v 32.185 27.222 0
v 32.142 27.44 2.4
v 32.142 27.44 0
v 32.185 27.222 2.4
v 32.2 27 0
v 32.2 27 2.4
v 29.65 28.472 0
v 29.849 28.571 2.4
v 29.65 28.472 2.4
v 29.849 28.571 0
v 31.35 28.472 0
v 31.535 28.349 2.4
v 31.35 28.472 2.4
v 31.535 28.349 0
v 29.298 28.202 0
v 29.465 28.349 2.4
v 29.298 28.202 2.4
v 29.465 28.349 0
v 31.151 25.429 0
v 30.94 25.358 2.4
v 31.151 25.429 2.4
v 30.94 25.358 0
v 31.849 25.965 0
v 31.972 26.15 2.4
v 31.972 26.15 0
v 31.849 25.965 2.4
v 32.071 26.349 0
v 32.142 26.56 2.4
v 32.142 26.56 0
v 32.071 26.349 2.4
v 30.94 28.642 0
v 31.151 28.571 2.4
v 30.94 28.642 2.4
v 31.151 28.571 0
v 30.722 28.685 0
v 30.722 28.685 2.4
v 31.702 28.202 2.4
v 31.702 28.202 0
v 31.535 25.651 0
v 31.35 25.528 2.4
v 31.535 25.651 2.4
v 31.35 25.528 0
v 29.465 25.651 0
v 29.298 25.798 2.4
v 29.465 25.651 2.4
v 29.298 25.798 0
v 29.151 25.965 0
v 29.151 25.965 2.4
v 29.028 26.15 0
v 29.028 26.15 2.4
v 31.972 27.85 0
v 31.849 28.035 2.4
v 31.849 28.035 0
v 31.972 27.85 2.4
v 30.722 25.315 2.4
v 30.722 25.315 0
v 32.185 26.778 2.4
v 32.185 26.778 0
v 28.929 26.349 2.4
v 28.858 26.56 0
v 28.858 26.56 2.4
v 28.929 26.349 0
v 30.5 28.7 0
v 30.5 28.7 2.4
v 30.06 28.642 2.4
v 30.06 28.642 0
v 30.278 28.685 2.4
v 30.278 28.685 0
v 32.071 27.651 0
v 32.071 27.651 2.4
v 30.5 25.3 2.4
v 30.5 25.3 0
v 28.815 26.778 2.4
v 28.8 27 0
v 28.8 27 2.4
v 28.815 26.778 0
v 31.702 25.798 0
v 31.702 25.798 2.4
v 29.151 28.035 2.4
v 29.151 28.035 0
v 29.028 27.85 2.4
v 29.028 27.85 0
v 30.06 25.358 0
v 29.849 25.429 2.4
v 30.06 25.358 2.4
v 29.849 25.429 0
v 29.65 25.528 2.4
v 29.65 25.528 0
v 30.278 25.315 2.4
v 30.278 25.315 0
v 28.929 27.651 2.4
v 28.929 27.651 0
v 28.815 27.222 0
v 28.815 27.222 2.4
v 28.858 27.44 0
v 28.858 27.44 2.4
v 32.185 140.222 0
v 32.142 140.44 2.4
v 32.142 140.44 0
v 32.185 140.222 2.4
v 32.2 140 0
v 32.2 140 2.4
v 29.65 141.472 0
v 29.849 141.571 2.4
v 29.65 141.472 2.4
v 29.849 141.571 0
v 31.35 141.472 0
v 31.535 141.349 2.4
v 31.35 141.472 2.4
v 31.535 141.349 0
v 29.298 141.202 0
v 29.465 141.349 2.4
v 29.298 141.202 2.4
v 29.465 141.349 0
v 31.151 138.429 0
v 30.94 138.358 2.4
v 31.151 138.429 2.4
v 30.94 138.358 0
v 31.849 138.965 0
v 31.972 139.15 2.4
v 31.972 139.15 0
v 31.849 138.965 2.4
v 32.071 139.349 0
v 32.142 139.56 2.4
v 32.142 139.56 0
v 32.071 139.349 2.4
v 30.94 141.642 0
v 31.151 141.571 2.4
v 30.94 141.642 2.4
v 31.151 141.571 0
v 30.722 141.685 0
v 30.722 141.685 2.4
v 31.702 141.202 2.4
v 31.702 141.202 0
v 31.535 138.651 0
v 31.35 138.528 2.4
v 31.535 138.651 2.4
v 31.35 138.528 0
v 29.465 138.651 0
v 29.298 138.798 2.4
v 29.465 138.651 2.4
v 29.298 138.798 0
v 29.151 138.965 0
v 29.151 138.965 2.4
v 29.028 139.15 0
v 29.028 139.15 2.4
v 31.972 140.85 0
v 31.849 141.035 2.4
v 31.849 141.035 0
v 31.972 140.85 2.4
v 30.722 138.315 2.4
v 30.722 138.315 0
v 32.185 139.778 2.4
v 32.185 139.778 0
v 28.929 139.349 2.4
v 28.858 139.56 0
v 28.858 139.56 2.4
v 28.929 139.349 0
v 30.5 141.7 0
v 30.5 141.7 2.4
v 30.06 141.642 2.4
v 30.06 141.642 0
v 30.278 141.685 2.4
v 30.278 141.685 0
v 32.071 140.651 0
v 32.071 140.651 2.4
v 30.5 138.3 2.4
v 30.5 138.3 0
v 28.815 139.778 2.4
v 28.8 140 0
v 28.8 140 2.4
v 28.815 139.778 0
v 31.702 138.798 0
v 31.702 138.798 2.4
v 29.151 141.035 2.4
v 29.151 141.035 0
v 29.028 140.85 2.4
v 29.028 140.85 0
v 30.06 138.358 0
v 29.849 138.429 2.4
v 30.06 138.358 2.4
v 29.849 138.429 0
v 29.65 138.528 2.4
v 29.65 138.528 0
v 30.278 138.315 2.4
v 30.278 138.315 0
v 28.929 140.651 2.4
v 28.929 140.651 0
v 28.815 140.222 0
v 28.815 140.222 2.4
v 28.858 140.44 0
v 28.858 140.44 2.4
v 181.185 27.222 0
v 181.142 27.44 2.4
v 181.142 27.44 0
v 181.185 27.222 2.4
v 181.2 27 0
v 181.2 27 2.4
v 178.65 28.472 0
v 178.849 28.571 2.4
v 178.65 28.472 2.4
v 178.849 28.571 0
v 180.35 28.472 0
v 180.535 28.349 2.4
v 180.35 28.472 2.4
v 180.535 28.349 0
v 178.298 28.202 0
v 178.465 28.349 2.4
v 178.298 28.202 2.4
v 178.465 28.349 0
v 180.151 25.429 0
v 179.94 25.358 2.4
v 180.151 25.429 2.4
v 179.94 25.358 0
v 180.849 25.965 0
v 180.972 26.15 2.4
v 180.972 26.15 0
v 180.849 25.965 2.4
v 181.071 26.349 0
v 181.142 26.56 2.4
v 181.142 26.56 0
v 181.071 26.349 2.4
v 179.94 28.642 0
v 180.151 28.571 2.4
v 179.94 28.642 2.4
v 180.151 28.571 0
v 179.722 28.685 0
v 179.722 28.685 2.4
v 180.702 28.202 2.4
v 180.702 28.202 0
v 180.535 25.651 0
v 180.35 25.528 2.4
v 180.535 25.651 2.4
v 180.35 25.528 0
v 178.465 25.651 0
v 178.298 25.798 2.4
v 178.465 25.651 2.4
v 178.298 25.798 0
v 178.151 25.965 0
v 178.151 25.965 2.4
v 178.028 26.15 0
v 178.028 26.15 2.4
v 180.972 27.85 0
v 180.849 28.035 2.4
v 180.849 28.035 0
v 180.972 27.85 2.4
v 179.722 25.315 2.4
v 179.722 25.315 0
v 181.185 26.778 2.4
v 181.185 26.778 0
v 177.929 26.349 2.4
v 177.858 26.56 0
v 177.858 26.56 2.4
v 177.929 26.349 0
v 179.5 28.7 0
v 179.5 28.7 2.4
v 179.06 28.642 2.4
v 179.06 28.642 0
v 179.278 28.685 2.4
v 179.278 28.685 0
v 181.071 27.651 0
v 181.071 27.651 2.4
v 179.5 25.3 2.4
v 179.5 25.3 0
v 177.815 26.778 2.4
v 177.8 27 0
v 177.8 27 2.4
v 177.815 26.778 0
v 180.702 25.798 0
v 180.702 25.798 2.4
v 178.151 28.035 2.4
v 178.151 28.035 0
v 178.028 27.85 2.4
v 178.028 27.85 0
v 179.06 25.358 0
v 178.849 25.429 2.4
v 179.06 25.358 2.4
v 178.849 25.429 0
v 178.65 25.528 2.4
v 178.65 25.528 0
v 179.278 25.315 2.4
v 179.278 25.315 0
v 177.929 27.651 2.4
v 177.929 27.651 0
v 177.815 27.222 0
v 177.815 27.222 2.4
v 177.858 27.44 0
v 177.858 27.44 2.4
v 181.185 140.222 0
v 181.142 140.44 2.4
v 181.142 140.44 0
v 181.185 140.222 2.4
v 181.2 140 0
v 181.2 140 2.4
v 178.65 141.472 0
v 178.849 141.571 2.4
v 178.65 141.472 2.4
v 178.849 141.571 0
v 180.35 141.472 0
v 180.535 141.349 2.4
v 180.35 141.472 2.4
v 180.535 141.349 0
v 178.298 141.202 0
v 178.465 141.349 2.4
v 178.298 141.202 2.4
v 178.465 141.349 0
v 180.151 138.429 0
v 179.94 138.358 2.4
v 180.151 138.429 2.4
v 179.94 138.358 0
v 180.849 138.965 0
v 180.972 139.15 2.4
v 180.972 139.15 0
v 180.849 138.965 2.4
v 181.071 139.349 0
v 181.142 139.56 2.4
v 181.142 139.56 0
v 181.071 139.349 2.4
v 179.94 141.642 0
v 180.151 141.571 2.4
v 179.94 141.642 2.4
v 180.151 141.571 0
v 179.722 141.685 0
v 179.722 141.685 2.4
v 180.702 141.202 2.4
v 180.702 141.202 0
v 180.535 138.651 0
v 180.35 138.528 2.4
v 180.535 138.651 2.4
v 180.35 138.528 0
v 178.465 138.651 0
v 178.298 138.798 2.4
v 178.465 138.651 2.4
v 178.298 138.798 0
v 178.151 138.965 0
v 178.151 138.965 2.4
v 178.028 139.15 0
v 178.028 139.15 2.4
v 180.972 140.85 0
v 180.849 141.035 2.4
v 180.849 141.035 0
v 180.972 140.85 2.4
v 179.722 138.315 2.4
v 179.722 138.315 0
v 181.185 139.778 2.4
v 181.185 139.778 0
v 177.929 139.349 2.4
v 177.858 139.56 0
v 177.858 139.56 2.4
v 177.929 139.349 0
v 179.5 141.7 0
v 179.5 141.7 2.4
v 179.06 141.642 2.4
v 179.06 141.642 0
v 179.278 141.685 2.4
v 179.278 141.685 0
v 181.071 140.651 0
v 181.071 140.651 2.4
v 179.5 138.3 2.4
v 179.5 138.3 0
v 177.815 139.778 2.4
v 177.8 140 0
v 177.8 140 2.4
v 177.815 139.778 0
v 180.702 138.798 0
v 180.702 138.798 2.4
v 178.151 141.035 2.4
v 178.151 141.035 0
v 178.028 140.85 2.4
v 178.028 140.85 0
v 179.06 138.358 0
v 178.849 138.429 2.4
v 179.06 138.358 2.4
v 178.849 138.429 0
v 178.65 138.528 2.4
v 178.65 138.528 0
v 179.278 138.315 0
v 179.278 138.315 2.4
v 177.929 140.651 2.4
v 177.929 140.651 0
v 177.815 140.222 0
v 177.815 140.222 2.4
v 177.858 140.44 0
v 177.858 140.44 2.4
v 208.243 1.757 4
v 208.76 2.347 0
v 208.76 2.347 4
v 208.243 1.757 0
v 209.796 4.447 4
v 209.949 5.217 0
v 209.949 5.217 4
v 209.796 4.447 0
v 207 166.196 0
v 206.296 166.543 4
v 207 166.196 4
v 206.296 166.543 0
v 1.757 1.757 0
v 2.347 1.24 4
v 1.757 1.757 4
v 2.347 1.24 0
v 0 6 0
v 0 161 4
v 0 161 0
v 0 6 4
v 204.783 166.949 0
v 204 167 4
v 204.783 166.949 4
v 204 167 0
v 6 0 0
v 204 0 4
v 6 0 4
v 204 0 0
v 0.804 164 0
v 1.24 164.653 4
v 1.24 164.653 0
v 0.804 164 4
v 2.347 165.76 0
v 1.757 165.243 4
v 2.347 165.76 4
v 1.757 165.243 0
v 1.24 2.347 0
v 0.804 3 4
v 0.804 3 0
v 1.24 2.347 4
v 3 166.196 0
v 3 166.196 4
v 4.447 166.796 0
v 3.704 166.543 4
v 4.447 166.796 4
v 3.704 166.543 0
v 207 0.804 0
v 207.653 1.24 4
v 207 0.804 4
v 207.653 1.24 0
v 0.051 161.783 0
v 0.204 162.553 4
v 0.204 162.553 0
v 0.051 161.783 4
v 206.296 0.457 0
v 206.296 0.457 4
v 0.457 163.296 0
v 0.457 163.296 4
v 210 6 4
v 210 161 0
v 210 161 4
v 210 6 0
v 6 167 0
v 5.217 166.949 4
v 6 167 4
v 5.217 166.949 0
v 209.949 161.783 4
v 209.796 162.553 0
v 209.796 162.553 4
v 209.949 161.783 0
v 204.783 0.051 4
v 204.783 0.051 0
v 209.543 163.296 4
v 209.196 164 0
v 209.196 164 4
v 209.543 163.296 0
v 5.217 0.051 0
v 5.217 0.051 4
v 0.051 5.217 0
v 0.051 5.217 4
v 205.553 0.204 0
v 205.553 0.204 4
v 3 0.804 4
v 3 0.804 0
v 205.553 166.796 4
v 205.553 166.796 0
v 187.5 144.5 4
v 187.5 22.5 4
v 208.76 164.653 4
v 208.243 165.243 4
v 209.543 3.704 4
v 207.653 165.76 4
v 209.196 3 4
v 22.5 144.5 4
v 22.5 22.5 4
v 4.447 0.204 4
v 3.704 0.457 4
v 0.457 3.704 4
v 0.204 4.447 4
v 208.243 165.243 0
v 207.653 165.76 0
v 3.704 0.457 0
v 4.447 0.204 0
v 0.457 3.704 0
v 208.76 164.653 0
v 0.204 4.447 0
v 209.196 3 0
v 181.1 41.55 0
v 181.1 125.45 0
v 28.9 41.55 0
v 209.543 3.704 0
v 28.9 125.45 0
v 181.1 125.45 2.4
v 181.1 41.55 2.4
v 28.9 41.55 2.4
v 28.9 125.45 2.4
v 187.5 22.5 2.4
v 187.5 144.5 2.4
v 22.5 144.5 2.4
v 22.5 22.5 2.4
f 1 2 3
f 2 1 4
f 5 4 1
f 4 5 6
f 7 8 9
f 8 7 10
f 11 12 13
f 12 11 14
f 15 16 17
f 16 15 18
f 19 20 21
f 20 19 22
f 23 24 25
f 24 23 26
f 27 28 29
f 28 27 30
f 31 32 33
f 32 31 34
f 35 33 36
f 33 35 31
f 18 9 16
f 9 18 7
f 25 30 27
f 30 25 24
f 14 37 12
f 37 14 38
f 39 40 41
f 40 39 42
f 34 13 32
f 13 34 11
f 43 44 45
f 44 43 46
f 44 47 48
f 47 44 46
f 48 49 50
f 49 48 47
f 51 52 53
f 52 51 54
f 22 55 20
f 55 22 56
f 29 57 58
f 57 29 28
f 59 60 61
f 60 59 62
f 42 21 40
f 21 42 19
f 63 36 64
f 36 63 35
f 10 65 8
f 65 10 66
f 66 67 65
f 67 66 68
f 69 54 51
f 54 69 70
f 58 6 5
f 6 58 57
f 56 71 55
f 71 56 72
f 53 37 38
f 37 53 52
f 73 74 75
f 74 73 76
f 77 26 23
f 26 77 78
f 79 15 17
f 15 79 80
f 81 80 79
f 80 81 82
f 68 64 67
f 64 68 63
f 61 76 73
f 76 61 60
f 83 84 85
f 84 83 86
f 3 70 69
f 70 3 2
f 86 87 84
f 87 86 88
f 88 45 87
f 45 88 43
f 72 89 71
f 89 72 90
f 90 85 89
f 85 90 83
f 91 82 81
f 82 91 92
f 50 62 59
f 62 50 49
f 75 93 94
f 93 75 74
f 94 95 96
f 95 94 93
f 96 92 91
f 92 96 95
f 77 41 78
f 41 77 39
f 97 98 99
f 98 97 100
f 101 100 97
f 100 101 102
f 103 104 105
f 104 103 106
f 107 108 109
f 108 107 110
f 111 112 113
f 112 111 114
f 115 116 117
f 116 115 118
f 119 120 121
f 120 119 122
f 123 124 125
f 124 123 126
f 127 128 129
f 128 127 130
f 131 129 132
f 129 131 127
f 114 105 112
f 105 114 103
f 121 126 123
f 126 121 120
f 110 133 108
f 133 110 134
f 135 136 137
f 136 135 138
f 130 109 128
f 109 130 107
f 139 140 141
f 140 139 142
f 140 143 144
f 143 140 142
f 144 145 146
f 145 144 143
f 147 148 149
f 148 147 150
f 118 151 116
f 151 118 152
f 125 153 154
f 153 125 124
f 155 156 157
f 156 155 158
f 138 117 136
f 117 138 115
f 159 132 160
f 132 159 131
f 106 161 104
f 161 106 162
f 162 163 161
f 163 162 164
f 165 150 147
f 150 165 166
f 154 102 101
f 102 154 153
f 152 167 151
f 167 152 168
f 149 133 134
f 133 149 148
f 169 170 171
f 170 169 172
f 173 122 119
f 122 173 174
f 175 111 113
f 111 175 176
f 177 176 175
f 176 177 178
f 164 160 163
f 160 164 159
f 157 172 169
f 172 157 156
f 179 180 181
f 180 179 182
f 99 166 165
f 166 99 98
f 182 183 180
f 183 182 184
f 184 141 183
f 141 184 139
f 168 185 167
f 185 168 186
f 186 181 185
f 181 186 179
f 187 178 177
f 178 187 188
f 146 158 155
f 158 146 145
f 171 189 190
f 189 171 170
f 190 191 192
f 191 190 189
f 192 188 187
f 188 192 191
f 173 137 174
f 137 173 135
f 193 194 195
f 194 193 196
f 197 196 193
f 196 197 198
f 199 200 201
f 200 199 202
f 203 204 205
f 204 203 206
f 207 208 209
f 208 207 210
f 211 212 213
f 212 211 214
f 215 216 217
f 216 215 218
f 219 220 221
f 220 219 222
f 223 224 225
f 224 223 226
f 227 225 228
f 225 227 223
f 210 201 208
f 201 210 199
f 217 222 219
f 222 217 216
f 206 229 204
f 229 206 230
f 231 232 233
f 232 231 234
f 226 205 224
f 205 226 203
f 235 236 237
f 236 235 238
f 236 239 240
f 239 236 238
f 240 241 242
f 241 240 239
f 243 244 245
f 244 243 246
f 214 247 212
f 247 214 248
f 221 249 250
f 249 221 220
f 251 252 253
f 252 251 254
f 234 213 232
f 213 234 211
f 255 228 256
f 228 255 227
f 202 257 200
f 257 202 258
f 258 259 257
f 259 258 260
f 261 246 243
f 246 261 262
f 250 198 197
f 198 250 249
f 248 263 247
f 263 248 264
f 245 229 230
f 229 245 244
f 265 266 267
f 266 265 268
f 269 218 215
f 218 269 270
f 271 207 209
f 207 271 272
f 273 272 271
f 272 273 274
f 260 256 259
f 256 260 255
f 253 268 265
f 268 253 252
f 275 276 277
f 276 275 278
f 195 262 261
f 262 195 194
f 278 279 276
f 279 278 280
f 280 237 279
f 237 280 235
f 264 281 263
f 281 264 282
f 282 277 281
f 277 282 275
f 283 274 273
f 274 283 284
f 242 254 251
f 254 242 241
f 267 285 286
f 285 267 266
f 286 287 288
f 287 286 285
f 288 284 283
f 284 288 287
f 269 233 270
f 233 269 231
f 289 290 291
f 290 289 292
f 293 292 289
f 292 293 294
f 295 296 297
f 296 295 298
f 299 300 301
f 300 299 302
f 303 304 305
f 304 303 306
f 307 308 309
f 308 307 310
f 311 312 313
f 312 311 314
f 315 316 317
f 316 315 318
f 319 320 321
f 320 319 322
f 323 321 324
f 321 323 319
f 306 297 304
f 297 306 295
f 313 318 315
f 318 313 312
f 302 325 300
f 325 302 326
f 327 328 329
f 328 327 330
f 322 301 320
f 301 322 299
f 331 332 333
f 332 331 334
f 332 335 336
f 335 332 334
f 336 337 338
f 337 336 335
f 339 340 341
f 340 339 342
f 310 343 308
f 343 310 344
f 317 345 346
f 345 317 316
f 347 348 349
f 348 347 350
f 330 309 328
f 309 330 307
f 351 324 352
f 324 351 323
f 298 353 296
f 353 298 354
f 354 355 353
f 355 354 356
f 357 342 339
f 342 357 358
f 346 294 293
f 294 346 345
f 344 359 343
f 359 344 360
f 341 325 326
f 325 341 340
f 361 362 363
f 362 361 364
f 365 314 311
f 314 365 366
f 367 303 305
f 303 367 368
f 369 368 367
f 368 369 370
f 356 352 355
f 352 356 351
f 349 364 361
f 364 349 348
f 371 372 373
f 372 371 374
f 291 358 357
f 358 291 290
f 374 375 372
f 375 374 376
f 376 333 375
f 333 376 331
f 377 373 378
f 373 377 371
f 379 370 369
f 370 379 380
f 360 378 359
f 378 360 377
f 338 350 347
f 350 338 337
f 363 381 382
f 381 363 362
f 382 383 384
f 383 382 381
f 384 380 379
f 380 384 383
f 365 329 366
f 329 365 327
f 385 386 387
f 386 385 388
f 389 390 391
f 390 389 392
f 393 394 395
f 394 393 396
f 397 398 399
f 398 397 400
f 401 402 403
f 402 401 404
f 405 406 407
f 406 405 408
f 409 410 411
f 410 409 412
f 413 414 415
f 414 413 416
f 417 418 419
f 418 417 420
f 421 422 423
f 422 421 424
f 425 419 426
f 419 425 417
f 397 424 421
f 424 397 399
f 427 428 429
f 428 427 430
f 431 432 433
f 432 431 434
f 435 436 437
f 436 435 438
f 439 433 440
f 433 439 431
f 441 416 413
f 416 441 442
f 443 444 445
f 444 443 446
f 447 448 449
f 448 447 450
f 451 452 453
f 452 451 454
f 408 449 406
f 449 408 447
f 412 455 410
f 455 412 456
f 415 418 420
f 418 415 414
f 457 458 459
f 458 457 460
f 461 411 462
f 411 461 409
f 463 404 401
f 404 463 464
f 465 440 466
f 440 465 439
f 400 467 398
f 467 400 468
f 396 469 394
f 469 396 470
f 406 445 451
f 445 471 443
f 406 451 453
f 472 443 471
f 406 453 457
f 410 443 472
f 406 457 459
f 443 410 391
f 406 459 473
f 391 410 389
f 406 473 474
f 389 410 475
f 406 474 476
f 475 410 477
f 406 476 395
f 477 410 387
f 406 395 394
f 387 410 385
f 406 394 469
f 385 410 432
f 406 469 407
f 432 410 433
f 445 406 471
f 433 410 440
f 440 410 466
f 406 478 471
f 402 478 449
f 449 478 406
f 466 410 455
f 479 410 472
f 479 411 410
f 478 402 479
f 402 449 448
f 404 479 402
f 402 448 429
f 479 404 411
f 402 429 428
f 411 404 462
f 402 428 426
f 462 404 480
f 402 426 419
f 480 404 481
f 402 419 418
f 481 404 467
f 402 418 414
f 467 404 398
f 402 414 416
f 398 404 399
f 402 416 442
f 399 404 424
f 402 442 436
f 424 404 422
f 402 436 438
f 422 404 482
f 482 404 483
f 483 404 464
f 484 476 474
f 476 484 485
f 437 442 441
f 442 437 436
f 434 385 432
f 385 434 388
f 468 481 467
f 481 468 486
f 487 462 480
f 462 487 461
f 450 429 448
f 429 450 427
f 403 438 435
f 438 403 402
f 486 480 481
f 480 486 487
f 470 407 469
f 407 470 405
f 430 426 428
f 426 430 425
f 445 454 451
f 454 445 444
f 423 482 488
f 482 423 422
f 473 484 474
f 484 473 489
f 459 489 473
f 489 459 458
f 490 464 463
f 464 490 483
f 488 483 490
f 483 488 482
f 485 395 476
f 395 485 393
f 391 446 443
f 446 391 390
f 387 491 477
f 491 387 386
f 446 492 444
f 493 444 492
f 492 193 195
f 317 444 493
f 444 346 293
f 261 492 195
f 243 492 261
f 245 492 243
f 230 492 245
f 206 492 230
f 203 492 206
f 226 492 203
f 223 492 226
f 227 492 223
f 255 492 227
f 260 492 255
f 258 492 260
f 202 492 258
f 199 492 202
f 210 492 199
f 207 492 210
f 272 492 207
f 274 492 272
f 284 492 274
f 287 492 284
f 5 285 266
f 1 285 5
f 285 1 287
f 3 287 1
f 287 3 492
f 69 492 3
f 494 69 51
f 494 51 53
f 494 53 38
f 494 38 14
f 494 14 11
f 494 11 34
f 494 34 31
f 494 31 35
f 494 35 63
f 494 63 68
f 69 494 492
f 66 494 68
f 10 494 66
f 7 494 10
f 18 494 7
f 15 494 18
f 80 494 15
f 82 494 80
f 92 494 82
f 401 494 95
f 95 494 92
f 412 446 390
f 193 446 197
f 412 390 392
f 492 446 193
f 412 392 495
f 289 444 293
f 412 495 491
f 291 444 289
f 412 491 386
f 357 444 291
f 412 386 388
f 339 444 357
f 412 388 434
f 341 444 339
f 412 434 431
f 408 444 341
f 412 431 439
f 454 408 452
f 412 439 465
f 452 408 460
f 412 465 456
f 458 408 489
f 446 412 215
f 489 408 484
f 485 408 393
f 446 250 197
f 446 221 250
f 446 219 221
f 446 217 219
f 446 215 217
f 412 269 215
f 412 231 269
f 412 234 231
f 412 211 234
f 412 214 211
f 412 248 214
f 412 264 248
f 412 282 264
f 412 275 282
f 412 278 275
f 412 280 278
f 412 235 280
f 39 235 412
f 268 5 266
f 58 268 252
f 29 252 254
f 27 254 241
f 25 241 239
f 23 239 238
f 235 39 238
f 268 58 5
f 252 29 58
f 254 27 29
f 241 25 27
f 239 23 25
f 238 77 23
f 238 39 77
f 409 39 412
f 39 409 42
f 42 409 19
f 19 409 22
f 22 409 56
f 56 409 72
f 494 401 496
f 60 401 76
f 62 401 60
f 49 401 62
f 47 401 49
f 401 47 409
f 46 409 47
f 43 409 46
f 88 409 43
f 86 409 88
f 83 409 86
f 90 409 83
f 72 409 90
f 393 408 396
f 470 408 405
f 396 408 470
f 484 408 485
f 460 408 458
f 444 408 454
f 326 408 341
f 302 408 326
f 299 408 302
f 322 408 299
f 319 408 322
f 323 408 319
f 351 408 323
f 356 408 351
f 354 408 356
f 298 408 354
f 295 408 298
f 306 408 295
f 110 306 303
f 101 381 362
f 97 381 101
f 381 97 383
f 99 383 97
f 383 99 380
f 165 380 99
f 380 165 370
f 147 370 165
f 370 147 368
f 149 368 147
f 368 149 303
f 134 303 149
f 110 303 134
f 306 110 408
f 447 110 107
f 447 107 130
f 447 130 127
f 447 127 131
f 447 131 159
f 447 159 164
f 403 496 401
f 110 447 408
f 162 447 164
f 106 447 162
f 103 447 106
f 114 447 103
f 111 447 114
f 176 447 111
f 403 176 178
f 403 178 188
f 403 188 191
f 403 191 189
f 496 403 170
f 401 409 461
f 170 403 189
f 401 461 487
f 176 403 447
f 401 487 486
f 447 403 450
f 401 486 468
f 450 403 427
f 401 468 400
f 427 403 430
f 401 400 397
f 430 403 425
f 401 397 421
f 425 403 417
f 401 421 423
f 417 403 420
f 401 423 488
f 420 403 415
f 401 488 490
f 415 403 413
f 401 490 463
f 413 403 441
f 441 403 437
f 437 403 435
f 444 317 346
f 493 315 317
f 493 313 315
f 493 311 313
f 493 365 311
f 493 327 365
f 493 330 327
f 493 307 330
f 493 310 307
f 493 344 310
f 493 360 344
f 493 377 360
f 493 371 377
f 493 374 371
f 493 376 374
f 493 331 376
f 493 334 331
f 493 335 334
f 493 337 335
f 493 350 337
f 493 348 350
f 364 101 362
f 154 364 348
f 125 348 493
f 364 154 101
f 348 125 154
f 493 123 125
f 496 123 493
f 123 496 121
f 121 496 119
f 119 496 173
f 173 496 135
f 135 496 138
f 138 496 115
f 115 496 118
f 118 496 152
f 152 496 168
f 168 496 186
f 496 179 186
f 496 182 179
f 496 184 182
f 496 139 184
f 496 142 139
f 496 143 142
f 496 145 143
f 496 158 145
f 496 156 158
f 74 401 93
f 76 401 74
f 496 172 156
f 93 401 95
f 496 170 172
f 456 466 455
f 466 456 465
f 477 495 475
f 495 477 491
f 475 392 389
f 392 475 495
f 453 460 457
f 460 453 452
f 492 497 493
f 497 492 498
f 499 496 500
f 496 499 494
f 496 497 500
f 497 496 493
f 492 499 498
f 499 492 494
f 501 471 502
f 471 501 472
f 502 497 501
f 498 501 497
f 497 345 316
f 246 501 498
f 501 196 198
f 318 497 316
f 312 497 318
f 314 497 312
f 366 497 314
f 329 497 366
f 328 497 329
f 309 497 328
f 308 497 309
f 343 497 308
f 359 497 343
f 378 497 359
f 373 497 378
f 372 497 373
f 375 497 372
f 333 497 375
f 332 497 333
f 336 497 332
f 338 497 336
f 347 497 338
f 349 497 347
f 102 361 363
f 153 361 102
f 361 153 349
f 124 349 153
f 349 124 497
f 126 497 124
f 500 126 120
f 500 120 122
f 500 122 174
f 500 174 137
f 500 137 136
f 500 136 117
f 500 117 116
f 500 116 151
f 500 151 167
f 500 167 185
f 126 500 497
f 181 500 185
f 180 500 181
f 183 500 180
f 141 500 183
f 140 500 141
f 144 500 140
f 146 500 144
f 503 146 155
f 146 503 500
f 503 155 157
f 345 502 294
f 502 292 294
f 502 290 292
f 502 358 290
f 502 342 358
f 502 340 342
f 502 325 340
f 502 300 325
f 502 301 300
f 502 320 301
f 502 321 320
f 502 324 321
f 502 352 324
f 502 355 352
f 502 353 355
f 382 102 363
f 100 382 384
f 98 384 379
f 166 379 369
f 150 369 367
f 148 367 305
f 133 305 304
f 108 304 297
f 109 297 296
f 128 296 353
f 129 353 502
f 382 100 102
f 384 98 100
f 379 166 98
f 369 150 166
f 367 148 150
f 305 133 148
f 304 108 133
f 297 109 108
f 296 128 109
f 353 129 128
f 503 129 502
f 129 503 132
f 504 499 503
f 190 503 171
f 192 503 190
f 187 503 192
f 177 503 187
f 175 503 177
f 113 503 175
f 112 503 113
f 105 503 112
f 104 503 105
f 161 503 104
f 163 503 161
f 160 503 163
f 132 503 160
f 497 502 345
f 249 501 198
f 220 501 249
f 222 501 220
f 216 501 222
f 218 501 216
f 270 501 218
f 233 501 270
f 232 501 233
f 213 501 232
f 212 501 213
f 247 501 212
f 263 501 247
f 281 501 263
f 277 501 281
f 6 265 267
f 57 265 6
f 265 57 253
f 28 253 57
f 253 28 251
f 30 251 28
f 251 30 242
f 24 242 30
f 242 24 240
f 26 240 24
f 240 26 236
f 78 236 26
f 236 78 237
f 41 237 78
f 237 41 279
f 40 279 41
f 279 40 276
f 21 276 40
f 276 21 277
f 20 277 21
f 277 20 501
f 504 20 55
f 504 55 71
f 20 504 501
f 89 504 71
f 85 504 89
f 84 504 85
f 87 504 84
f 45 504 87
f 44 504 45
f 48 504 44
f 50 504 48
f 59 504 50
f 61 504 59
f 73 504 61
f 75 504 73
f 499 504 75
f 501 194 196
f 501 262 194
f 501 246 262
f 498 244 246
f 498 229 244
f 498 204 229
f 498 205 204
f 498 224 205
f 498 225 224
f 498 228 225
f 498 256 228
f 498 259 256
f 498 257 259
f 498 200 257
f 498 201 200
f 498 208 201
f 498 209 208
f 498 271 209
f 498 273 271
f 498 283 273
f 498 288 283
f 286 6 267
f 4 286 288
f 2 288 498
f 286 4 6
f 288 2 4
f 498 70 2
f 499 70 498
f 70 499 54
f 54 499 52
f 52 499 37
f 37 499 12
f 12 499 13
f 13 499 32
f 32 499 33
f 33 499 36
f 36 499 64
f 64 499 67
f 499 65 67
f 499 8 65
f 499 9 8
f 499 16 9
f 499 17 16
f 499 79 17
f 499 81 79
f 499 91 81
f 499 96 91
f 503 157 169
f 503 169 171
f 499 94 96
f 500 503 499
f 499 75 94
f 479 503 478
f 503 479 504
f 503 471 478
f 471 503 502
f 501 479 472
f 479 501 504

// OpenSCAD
// Flock Flux enclosure, parametric.
//
// Open in OpenSCAD (free, openscad.org). Change `part` at the top, press F6,
// then File > Export > STL for a 3D printer, or Export > DXF/SVG for a laser
// cutter. Every dimension is a named variable, so a wrong measurement is a
// one-line fix and a re-print, not a redesign.
//
// ---------------------------------------------------------------------------
// PRINT THESE FIRST. Do not print a whole box yet.
//
//   this file:              part = "screen_fit_test"   about an hour
//   flux-sensor-head.scad:  part = "head_fit_test"     about twenty minutes
//
// The first says whether the screen sits flush in its window with its screws
// on their holes; the second whether the camera and the doorway counter fit
// behind their openings. Get both right in cheap plastic before anything else
// is printed and long before any acrylic is cut. Ready-made STL and DXF files
// for every part are in stl/ and dxf/ beside this file.
// ---------------------------------------------------------------------------

part = "screen_fit_test";
// screen_fit_test | slot_fit_test | front | back | top | bottom | side | assembled

// The big panels are 228 mm across, which is wider than most school 3D printer
// beds, and printed plastic shows its layer lines from a metre away. So the flat
// panels get laser cut from acrylic and only the small brackets and mounts get
// printed. Set this true, render the panel you want, and export DXF or SVG for
// the cutter. Leave it false for STL.
flat = false;

// ===========================================================================
// MEASURED, from datasheets. Trust these.
// ===========================================================================

// Raspberry Pi 5. Board 85 x 56, four M2.5 holes on a 58 x 49 grid, each 3.5 mm
// in from the board edges.
pi_w            = 85.0;
pi_d            = 56.0;
pi_hole_dx      = 58.0;
pi_hole_dy      = 49.0;
pi_hole_inset   = 3.5;
pi_hole_dia     = 2.7;   // clearance for M2.5

// THE SCREEN IS NOT THE PART THIS FILE FIRST ASSUMED. It was written for a
// Raspberry Pi Touch Display 2, a 720x1280 portrait DSI panel, because that is
// what an early build plan named. The panel in hand is a Lebula/ROADOM 7 inch
// 1024x600 HDMI touchscreen: landscape, and a carrier board rather than a bare
// panel, carrying two speakers, five buttons and a Pi Zero mounting outline.
// The PCB is what the box has to swallow, not the LCD.
//
// HOW THESE WERE MEASURED, and why the first attempt was wrong by 11%.
//
// The board was photographed beside a US one dollar note, which is
// 155.956 x 66.294 mm on every note printed. Scaling against the note gave
// 180 x 127 and that number was committed. It is wrong. The note lay flat on
// the desk while the board sat above it on the LCD's own thickness, so the
// board was nearer the lens and photographed bigger. Close in, that is worth
// about a tenth.
//
// The fix was to stop using the note. The lit area is 154.21 x 85.92 by spec,
// it lies in the SAME PLANE as the board, and a photograph of the screen
// switched on measures its aspect at 1.787 against the spec's 1.795, which is
// 0.4% and confirms both the spec and the reading. Scaled against the lit area
// instead, the board lands within 3 mm of the published generic 7 inch panel,
// which the inflated numbers did not.
//
// The lesson generalises: a scale reference has to lie in the plane being
// measured, or it is measuring a different plane.
screen_outer_w  = 162.0;   // long edge, horizontal
screen_outer_h  = 119.0;   // short edge, vertical
screen_thick    = 12.0;    // MEASURE: board plus the LCD behind it
screen_slack    = 3.0;     // what is left of the doubt

// Four mounting holes in small tabs at the corners, outside the LCD. Read off
// the same photograph, so carrying the same few millimetres; the fit test
// settles them before anything is cut.
screen_hole_dx  = 149.0;
screen_hole_dy  = 113.0;
screen_hole_dia = 3.4;     // M3 clearance, MEASURE

// The lit area, and where it sits. 1024x600 on a 7 inch diagonal is
// 154.21 x 85.92, every vendor publishes exactly that, and the photograph
// agrees to within half a percent.
//
// IT IS NOT CENTRED, which is the part worth knowing. The borders measure
// about 4 mm at each side but 14 mm above the picture and 17 mm below it, so
// a window cut on the board's centre line sits about 1.5 mm high. Small, and
// exactly the kind of small that reads as sloppy on a finished panel.
screen_active_w = 154.2;
screen_active_h = 85.9;
screen_border_l = 3.8;     // board's left edge to the lit area
screen_border_b = 17.4;    // board's bottom edge to the lit area
screen_border_t = 14.4;    // kept explicit so the asymmetry is not lost again

// Anker Prime 20K 200W, model A1336 read off the unit's own label:
// 124 x 53 x 48.
//
// One of the 53 x 48 end faces carries five pogo contacts for Anker's
// charging dock, which the spec page does not mention. That face has to stay
// clear, or the battery can only be charged by opening the box, and nobody is
// doing that between rounds at a competition.
batt_w          = 124.0;
batt_h          = 53.0;
batt_d          = 48.0;
batt_contacts_face = "bottom";   // where the five dock pins look

// The Pi 5 with its heatsink and the 4G HAT on top. RESERVED, not measured.
//
// Two attempts failed and both failed the same way. A dollar note stood on
// edge beside the stack ran out of frame, so its length was unknown. Scaling
// off the GPIO header should have worked instead, since those pins are 2.54 mm
// apart by definition, but the photograph is too soft to resolve them: the
// gaps between detected pins came out between 10 and 20 pixels when every one
// of them is the same distance.
//
// An autocorrelation over that strip answered 14 px with harmonics at 28 and
// 42, which looks clean and is not. A periodic signal that is not actually
// resolved still autocorrelates, and the harmonics follow from the assumed
// period rather than confirming it. Comparing against the length of a 20 pin
// row is what caught it.
//
// So this is a reservation from the spec route: about 18 mm for a Pi 5 to the
// top of its ports, 11 mm of standard HAT spacing, and the HAT's own parts and
// heatsink for the rest. The box is 88.9 mm deep, so a wrong guess costs
// nothing here. Confirm at assembly.
pi_stack_h      = 55.0;

// PureThermal 3 carrier: 25.8 x 28.9 from the October 2022 datasheet.
pt3_w           = 25.8;
pt3_h           = 28.9;

// ===========================================================================
// STILL UNKNOWN. Both are in the datasheet's dimension drawing, which is a
// picture rather than text, and both are small enough to check against the
// printed slot_fit_test piece rather than measured in advance.
// ===========================================================================

pt3_hole_dx     = 20.0;    // MEASURE
pt3_hole_dy     = 23.0;    // MEASURE

// The lens barrel that has to see out of the front face.
lens_dia        = 11.0;    // MEASURE

// ===========================================================================
// DESIGN CHOICES. These are yours to change.
// ===========================================================================

// The portrait question is CLOSED, and it closed itself. The panel is
// 1024x600, which is landscape, so the 11.5 mm shortfall that was going to
// force the box to 8.75 inches tall never existed: it came from the DSI panel
// this file was first written against. The locked 9 x 7 inch box holds a
// 162 x 119 board with 67 mm spare across and 59 mm up, which is room for the
// bezel and then some.
//
// main.py now reads its layout from whatever the framebuffer reports and lays
// the three readings out in columns when the panel is wider than it is tall,
// so nothing in the code depends on this either way. There is no `portrait`
// variable any more: screen_outer_w and screen_active_w mean horizontal and
// the _h pair mean vertical, full stop. The flag survived one edit after the
// panel changed and by then it was swapping the axes the wrong way round.
box_w           = 228.6;   // 9 inch
box_h           = 177.8;   // 7 inch, back to the original lock
box_d           = 88.9;                       // 3.5 inch

wall            = 4.0;    // 3 mm acrylic later; 4 mm prints stronger
bezel           = 16.0;   // border of material around the visible screen
corner_r        = 6.0;    // rounded corners, front face only

// The hand-pass slot through the top. OFF: it was there for the break beam,
// which is gone. The doorway counter lives in the sensor head now, so the base
// is a closed box, and a hole in its top with nothing under it reads as a
// mistake and lets dust in. Set true to cut it again.
hand_slot       = false;
slot_w          = 127.0;  // 5 inch
slot_d          = 38.0;   // 1.5 inch
slot_from_front = 22.0;   // how far back from the front face

// Screw bosses that hold the panels together.
boss_dia        = 9.0;
boss_hole       = 2.7;

$fn = 48;

// ===========================================================================
// Helpers
// ===========================================================================

module rounded_plate(w, h, t, r) {
    hull() for (x = [r, w - r], y = [r, h - r])
        translate([x, y, 0]) cylinder(h = t, r = r);
}

module pi_hole_pattern(depth) {
    ox = (pi_w - pi_hole_dx) / 2;
    oy = (pi_d - pi_hole_dy) / 2;
    for (x = [ox, ox + pi_hole_dx], y = [oy, oy + pi_hole_dy])
        translate([x, y, -1]) cylinder(h = depth + 2, d = pi_hole_dia);
}

// The visible opening. Slightly smaller than the active area on every side so
// the panel overlaps the glass edge and no black border shows through.
module screen_opening(t) {
    overlap = 1.0;
    w = screen_active_w - 2 * overlap;
    h = screen_active_h - 2 * overlap;
    // Centre the BOARD in the panel, then put the window where the lit area
    // actually falls on it. Centring the window instead would push the board
    // 1.5 mm low and take the mounting tabs off their holes.
    bx = (box_w - screen_outer_w) / 2;
    by = (box_h - screen_outer_h) / 2;
    translate([bx + screen_border_l + overlap,
               by + screen_border_b + overlap, -1])
        cube([w, h, t + 2]);
}

// ===========================================================================
// Test pieces. Print these two first.
// ===========================================================================

// A frame just big enough to hold the screen, so the cutout and the standoffs
// can be checked against the real part for the cost of an hour of filament.
module screen_fit_test() {
    m = 24;  // margin of material around the module
    w = screen_outer_w + 2 * m;
    h = screen_outer_h + 2 * m;
    ow = screen_active_w - 2;
    oh = screen_active_h - 2;
    difference() {
        rounded_plate(w, h, wall, corner_r);
        translate([(w - ow) / 2, (h - oh) / 2, -1]) cube([ow, oh, wall + 2]);
        // A shallow rebate the module drops into, so it sits flush.
        // Cut to the upper end of the measurement, so a board that turns out
        // to be 5 mm bigger than the photo said still drops in. A test piece
        // that is too tight teaches nothing except that it is too tight.
        translate([(w - screen_outer_w - screen_slack) / 2,
                   (h - screen_outer_h - screen_slack) / 2,
                   wall - 1.6])
            cube([screen_outer_w + screen_slack,
                  screen_outer_h + screen_slack, 2]);
        // The four corner holes. The point of printing this is to hold the
        // real board against it and see whether the screws line up, so a test
        // piece without them tests half the fit.
        for (dx = [-screen_hole_dx / 2, screen_hole_dx / 2],
             dy = [-screen_hole_dy / 2, screen_hole_dy / 2])
            translate([w / 2 + dx, h / 2 + dy, -1])
                cylinder(h = wall + 2, d = screen_hole_dia);
    }
}

// The slot, a hand's width of it, with the sensor mount beside it. Checks two
// things at once: that a hand passes without catching, and that the sensor
// looks across the gap at the right height.
module slot_fit_test() {
    w = slot_w + 40;
    h = slot_d + 40;
    difference() {
        cube([w, h, wall]);
        translate([20, 20, -1]) cube([slot_w, slot_d, wall + 2]);
        // Crossing sensor, mounted on the long wall looking across the slot.
        translate([w / 2, 12, wall / 2]) rotate([-90, 0, 0])
            cylinder(h = 20, d = 5.2);
        // Two M2.5 holes to bolt the sensor board down beside it.
        for (dx = [-10, 10])
            translate([w / 2 + dx, 8, -1]) cylinder(h = wall + 2, d = pi_hole_dia);
    }
}

// ===========================================================================
// Panels
// ===========================================================================

// The two indicators. Deliberately two and not five: every light on a box has
// to mean something a person can act on, and the screen already says
// everything else.
//
//   POWER  green, solid.        The battery is alive.
//   LINK   amber, blinks.       The head is talking and readings are going out.
//
// LINK is the one that earns its place. A sensor whose cable has come out
// looks exactly like a sensor in an empty room, which is the confusion this
// whole project keeps running into, and a light that stops blinking is the
// cheapest possible answer to it.
led_dia         = 3.2;    // 3 mm LED, press fit
led_gap         = 14.0;   // between the two
led_y           = 15.0;   // up from the bottom edge, in the strip below the board

module front_panel() {
    difference() {
        rounded_plate(box_w, box_h, wall, corner_r);
        screen_opening(wall);
        // Below the screen, centred, in the 29 mm of panel the board leaves.
        // No thermal lens and no microphone on this box: both moved to the
        // sensor head when the device split in two, and a second set of holes
        // here would be holes into an empty space.
        for (dx = [-led_gap / 2, led_gap / 2])
            translate([box_w / 2 + dx, led_y, -1])
                cylinder(h = wall + 2, d = led_dia);
    }
}

module top_panel() {
    difference() {
        cube([box_w, box_d, wall]);
        if (hand_slot)
            translate([(box_w - slot_w) / 2, slot_from_front, -1])
                cube([slot_w, slot_d, wall + 2]);
    }
}

module back_panel() {
    difference() {
        cube([box_w, box_h, wall]);
        // USB-C charging port, the only cable a judge ever sees.
        translate([box_w - 40, 30, -1]) cube([10, 5, wall + 2]);
        // The head's cable, in on the same side as the charging port so all
        // the wiring lives at one end and the other three faces stay clean.
        translate([box_w - 62, 28, -1]) cylinder(h = wall + 2, d = 10.0);
        // Vents. The Pi 5 and the modem both make heat in a sealed box.
        for (x = [0 : 12 : 90], y = [0 : 12 : 60])
            translate([40 + x, box_h - 110 + y, -1]) cylinder(h = wall + 2, d = 5);
    }
}

module bottom_panel() {
    difference() {
        cube([box_w, box_d, wall]);
        // Pi mounting holes, offset so its ports face the back.
        translate([(box_w - pi_w) / 2, 14, 0]) pi_hole_pattern(wall);
        for (x = [0 : 12 : 60])
            translate([box_w / 2 - 30 + x, box_d - 18, -1]) cylinder(h = wall + 2, d = 5);
    }
}

module side_panel() {
    cube([box_d, box_h, wall]);
}

// ===========================================================================

module render_part() {
    if      (part == "screen_fit_test") screen_fit_test();
    else if (part == "slot_fit_test")   slot_fit_test();
    else if (part == "front")           front_panel();
    else if (part == "back")            back_panel();
    else if (part == "top")             top_panel();
    else if (part == "bottom")          bottom_panel();
    else if (part == "side")            side_panel();
}

if (part != "assembled") {
    // projection() flattens the panel to the single outline and set of holes a
    // cutter wants. Every panel here is a flat plate, so nothing is lost.
    if (flat) projection(cut = false) render_part();
    else render_part();
}
else {
    color("white", 0.35) {
        translate([0, 0, box_d - wall]) front_panel();
        rotate([90, 0, 0]) translate([0, 0, -wall]) bottom_panel();
        translate([0, box_h, 0]) rotate([90, 0, 0]) top_panel();
        rotate([0, -90, 0]) translate([0, 0, -wall]) side_panel();
        translate([box_w, 0, 0]) rotate([0, -90, 0]) side_panel();
    }
    // The three things that have to fit inside, to scale.
    color("green", 0.5) translate([(box_w - pi_w) / 2, 14, 6]) cube([pi_w, pi_d, 20]);
    color("orange", 0.5) translate([12, box_h - batt_h - 12, 6]) cube([batt_w, batt_h, batt_d]);
    color("blue", 0.3) translate([(box_w - screen_outer_w) / 2,
                                  (box_h - screen_outer_h) / 2,
                                  box_d - wall - screen_thick])
        cube([screen_outer_w,
              screen_outer_h, screen_thick]);
}
